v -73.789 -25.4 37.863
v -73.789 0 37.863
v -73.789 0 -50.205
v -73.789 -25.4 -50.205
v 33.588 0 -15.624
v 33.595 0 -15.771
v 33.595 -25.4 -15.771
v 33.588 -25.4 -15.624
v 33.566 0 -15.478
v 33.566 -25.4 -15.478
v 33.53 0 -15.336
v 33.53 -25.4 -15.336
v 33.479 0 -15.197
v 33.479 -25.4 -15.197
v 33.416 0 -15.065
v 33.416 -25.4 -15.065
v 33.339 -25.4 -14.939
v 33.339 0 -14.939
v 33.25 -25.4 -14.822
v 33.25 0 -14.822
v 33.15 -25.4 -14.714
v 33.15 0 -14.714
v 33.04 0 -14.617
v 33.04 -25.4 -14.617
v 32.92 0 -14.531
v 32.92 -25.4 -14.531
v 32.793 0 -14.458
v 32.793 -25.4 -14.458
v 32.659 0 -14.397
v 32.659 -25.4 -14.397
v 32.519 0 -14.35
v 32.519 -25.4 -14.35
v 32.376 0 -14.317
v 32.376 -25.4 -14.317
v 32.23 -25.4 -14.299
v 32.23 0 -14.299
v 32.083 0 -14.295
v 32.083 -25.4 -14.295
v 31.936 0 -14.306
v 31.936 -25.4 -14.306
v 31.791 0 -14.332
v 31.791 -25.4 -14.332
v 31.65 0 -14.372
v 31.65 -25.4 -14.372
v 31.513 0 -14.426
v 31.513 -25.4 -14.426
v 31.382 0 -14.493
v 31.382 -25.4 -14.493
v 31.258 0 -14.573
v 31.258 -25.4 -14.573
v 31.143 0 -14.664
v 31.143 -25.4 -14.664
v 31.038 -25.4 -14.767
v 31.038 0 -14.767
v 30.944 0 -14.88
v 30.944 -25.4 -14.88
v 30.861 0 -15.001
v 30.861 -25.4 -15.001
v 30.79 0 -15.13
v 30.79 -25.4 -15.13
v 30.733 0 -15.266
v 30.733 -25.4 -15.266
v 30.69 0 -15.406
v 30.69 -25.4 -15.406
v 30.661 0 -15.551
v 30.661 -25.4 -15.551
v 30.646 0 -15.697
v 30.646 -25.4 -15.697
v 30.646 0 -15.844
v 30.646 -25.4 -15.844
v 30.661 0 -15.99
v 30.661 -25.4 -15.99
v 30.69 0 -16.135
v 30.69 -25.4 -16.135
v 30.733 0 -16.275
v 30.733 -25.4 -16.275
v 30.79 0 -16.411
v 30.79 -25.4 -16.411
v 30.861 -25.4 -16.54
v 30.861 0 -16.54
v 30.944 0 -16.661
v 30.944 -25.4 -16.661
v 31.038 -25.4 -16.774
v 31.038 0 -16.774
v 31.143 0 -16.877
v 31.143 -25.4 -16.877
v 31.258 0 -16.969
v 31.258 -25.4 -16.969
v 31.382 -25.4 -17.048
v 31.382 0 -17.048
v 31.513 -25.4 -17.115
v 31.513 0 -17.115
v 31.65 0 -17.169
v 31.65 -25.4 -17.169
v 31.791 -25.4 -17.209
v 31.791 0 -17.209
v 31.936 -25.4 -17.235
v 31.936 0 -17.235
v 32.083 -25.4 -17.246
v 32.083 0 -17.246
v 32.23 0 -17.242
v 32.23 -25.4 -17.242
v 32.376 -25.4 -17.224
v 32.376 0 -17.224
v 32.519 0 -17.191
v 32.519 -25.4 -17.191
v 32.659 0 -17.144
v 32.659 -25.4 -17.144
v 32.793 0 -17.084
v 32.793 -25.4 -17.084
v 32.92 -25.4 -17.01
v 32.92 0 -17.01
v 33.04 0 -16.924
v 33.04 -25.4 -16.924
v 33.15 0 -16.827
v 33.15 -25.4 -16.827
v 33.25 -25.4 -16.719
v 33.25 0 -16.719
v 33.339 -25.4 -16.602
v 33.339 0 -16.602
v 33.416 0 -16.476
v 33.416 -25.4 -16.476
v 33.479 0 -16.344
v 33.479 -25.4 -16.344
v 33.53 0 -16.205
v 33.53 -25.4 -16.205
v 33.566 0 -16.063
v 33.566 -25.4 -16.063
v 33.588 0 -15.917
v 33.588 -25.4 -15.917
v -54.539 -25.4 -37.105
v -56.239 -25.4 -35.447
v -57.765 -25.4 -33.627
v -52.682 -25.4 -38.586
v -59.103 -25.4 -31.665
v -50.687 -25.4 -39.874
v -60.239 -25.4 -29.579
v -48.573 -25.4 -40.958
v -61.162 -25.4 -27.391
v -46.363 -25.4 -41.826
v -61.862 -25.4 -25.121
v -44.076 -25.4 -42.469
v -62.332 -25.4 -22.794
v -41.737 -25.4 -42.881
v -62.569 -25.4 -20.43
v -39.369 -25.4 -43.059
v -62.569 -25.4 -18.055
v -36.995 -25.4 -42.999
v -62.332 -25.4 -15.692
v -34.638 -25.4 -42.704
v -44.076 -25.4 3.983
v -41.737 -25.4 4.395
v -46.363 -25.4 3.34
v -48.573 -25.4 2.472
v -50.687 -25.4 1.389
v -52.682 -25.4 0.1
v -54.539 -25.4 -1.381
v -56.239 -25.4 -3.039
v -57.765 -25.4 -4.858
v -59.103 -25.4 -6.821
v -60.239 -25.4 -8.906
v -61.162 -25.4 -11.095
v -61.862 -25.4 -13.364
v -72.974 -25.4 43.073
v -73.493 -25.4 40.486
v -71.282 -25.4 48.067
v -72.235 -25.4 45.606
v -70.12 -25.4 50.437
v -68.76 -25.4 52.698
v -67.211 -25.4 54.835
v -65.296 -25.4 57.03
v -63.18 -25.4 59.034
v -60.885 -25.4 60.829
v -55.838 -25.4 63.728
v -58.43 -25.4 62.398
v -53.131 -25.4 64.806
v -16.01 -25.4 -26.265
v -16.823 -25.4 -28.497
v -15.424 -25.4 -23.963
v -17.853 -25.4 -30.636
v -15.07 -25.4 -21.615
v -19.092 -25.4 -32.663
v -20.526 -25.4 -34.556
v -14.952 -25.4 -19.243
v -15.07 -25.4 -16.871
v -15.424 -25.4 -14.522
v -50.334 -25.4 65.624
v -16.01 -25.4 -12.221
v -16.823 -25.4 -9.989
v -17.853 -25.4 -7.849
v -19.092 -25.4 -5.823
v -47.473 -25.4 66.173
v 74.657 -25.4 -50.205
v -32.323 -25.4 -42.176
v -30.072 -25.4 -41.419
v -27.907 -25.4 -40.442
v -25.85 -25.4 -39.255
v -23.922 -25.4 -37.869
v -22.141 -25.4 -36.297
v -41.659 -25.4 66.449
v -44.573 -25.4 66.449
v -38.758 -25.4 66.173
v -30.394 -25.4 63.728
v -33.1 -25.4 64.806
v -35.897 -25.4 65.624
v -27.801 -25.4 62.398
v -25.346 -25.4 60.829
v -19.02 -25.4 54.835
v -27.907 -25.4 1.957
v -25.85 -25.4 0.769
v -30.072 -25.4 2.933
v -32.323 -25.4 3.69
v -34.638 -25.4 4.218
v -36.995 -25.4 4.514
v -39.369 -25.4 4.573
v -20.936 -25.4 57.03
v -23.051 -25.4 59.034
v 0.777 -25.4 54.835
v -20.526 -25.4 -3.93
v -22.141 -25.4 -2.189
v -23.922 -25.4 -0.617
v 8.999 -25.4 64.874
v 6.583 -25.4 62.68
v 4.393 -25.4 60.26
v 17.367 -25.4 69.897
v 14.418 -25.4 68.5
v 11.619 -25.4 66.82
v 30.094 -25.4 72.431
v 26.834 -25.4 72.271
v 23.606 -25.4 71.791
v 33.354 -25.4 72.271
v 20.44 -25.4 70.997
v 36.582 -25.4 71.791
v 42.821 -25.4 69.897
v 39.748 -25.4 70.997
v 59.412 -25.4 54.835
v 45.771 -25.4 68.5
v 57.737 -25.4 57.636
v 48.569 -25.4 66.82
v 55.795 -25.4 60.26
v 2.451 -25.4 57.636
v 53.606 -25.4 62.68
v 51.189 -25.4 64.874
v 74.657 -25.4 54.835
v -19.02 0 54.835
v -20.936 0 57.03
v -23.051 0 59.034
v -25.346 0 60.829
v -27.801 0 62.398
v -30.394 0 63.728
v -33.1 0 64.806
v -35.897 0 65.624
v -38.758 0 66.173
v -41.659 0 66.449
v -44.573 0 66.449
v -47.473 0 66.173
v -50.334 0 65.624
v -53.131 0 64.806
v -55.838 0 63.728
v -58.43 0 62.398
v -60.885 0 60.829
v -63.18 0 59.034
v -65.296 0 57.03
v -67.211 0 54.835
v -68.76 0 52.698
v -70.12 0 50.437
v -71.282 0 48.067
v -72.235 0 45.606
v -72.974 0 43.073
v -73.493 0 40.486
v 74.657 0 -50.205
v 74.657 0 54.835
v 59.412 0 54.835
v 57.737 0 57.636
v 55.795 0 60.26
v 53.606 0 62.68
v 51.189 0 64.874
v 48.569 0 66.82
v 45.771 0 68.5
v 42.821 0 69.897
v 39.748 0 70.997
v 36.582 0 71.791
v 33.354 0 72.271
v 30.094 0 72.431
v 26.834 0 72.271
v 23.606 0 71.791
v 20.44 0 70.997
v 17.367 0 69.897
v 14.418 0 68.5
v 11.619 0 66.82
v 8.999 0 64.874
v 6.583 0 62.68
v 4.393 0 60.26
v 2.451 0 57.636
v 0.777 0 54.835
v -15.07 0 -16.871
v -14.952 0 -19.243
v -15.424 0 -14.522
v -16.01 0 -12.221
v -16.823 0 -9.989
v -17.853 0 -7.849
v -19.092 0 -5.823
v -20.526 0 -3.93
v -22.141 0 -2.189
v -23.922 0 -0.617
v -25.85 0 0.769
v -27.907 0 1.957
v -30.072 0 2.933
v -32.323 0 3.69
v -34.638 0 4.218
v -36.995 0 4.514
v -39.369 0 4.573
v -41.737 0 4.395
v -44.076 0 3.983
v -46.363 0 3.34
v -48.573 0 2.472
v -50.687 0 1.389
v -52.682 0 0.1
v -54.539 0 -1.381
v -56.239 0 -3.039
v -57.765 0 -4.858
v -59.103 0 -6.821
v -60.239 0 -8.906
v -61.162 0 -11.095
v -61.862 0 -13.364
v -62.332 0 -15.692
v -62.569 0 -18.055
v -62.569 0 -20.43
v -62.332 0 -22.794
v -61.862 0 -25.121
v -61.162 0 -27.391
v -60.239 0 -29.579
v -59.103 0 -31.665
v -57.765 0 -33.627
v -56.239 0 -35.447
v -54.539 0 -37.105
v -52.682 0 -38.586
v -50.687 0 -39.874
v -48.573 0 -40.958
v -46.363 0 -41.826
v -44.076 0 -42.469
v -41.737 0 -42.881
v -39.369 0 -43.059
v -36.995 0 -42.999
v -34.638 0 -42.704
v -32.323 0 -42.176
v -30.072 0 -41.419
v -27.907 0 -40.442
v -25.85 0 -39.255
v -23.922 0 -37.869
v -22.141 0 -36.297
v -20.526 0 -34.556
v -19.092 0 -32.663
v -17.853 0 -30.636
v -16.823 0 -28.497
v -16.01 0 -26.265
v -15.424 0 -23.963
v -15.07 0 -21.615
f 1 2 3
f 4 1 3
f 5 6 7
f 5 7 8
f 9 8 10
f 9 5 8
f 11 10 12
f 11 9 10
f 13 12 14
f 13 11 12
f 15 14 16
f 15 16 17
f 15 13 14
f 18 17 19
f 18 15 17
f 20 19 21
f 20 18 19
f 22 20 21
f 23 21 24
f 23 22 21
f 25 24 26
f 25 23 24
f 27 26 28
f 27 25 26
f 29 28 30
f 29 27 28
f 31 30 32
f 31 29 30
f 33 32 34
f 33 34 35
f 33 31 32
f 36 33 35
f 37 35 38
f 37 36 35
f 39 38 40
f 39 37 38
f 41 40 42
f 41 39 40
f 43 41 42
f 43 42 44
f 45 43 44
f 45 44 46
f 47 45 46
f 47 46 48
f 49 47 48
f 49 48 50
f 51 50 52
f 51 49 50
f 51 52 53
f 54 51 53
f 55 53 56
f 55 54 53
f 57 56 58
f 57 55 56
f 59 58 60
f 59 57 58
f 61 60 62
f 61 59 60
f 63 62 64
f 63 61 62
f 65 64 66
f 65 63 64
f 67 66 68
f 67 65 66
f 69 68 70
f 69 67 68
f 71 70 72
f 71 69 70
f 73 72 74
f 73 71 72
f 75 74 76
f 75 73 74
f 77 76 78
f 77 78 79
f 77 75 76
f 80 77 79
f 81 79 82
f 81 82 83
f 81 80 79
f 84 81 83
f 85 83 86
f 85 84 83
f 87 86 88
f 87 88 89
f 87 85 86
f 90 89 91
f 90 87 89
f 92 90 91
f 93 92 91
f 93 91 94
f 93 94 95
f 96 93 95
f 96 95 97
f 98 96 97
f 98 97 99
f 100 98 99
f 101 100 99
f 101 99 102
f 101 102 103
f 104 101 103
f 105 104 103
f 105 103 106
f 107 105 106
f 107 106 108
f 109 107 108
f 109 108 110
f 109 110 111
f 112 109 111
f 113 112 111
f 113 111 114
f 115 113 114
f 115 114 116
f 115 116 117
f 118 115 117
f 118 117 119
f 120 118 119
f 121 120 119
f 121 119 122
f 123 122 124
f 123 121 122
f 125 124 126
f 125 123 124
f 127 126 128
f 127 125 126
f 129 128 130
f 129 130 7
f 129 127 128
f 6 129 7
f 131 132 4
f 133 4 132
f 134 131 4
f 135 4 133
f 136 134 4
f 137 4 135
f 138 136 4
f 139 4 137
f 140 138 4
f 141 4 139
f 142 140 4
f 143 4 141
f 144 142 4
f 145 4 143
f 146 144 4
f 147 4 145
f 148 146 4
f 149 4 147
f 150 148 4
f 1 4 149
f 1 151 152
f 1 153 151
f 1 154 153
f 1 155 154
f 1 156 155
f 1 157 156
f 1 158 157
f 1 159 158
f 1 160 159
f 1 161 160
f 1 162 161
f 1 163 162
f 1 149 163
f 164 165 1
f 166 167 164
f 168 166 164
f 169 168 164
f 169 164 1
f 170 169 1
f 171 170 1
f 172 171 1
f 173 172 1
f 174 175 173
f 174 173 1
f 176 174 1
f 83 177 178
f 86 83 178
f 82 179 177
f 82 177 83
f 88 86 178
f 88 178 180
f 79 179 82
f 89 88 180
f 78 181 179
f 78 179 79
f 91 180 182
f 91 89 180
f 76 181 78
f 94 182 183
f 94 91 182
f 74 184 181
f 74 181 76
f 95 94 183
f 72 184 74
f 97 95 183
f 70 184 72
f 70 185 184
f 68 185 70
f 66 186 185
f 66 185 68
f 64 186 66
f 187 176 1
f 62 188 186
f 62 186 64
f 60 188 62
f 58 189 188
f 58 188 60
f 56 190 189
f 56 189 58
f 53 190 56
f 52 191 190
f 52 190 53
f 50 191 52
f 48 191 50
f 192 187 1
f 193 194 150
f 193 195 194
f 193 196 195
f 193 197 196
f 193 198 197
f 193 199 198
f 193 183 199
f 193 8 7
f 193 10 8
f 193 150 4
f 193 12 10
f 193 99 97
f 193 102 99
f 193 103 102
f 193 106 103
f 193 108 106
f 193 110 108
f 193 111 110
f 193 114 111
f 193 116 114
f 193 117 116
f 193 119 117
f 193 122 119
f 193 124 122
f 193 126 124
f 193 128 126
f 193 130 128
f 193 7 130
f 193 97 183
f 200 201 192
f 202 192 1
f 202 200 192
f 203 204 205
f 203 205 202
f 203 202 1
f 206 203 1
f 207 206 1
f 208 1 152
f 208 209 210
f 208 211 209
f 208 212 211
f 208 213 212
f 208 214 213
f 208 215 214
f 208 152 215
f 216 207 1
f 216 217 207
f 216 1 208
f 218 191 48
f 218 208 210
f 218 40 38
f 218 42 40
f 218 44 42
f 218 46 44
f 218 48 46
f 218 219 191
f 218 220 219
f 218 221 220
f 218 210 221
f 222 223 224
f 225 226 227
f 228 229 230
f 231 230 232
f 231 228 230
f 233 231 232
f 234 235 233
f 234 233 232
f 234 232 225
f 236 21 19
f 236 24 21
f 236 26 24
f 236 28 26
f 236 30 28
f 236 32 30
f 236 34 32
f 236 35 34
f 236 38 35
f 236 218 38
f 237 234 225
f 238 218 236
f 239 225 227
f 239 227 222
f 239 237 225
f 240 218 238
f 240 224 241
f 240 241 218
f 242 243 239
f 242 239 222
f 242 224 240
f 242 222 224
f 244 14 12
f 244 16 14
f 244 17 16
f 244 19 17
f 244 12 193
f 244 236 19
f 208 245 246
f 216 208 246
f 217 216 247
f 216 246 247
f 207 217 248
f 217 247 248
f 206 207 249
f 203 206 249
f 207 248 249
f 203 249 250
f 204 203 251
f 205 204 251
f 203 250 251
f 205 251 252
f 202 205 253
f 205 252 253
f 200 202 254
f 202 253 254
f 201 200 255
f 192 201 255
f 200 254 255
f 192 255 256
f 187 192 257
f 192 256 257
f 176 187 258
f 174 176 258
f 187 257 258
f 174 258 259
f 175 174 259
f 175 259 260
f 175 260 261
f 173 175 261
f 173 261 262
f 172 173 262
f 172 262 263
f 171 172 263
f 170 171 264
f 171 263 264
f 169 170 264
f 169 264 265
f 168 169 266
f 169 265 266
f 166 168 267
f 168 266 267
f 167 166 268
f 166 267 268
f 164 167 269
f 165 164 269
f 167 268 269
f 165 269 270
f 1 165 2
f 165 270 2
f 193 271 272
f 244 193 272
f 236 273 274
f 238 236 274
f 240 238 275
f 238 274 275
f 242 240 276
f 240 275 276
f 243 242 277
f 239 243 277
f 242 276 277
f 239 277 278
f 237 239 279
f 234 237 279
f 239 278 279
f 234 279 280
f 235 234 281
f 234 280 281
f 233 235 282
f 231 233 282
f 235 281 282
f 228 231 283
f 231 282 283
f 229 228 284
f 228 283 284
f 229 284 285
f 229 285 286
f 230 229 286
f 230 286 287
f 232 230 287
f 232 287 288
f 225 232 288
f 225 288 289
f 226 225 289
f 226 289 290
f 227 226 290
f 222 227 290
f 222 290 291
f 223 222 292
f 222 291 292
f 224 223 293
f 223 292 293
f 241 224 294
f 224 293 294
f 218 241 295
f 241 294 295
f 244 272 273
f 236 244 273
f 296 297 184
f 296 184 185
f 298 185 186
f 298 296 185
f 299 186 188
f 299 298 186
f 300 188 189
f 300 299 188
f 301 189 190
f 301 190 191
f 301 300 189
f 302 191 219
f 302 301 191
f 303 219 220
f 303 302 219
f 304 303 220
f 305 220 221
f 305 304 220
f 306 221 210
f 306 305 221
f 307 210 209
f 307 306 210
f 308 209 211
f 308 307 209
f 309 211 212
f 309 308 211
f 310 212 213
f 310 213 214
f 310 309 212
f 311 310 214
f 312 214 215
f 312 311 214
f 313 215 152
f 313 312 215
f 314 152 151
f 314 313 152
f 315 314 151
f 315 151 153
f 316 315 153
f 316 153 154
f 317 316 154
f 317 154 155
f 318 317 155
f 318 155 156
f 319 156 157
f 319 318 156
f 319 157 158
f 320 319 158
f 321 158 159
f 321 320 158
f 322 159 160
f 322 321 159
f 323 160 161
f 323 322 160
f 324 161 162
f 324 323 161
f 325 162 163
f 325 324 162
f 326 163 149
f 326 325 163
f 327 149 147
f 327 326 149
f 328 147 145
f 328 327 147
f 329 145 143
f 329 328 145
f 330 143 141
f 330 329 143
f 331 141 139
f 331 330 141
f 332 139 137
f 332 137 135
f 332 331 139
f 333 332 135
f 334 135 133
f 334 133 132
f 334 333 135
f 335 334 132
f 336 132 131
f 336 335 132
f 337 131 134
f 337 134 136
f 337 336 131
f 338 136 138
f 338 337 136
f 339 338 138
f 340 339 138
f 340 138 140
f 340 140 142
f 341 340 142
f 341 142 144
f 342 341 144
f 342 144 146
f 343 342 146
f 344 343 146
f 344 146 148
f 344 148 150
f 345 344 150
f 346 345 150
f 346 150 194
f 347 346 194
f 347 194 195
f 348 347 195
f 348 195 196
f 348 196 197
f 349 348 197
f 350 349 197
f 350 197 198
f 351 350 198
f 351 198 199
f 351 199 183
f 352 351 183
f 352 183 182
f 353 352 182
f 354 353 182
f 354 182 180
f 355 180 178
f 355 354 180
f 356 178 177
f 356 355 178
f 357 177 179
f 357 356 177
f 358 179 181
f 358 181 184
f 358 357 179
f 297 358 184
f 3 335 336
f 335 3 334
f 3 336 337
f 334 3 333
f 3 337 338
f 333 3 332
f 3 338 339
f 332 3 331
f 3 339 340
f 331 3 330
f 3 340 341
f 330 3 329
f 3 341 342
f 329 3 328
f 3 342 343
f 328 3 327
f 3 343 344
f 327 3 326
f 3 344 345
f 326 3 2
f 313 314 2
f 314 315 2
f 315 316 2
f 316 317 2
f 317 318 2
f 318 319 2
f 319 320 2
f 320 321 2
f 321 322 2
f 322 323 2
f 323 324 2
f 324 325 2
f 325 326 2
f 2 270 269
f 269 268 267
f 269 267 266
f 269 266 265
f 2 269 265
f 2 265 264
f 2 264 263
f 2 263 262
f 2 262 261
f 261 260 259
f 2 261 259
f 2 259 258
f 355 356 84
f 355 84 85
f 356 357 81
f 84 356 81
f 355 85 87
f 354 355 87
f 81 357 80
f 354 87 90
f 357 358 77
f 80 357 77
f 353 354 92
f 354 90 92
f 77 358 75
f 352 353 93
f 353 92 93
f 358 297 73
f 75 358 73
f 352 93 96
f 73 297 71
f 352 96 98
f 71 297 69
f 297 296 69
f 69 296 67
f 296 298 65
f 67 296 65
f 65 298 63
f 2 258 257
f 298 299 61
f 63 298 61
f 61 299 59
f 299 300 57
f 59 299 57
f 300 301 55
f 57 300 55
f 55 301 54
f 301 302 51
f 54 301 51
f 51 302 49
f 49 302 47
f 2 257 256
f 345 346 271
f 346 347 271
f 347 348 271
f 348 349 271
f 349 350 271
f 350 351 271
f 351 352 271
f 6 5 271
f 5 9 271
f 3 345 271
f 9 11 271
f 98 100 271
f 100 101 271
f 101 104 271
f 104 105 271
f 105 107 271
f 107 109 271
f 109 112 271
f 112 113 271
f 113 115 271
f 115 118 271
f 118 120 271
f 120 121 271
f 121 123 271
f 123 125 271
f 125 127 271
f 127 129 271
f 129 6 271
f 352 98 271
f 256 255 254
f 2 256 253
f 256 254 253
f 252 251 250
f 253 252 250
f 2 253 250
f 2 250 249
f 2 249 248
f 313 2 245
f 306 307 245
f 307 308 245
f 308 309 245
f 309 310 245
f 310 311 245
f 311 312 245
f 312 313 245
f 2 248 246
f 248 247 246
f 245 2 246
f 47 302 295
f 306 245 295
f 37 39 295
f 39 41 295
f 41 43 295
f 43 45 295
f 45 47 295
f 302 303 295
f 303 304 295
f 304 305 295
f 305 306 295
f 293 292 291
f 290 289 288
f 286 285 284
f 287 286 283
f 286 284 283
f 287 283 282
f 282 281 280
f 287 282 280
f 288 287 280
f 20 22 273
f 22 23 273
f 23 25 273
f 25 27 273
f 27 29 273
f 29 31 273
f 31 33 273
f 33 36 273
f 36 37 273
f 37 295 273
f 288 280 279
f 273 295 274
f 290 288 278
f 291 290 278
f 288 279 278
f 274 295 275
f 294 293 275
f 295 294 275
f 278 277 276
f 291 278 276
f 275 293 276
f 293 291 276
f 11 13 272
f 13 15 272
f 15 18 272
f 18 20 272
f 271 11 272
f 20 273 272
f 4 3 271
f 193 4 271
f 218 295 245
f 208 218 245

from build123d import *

# Parameters (mm, degrees)
F0_R     = 23.8231892188
F0_R_2   = 16.1761148504
F0_R_3   = 1.4754891284
F1_DEPTH = 25.4


with BuildPart() as f1:
    # F0 (on Front) → F1 (new body)
    with BuildSketch(Plane.XZ):
        with BuildLine():
            ThreePointArc((59.4117882899, 54.835062474), (30.0941746682, 72.4310516269), (0.7765610465, 54.835062474))
            Line((0.7765610465, 54.835062474), (59.4117882899, 54.835062474))
        make_face()
        with BuildLine():
            Line((59.4117882899, 54.835062474), (0.7765610465, 54.835062474))
            ThreePointArc((0.7765610465, 54.835062474), (22.0410833069, 6.9782518983), (63.3159871103, 39.2092391849))
            ThreePointArc((63.3159871103, 39.2092391849), (62.3251619547, 47.2623305461), (59.4117882899, 54.835062474))
        make_face()
        with BuildLine():
            Line((-19.0199100919, 54.835062474), (-67.2114855104, 54.835062474))
            ThreePointArc((-67.2114855104, 54.835062474), (-71.7847333832, 46.8469948963), (-73.788613081, 37.8632158535))
            Line((-73.788613081, 37.8632158535), (-73.788613081, 33.6104571325))
            ThreePointArc((-73.788613081, 33.6104571325), (-42.0518711488, 5.0087142952), (-12.3691659487, 35.736836493))
            ThreePointArc((-12.3691659487, 35.736836493), (-14.079417691, 45.8483971203), (-19.0199100919, 54.835062474))
        make_face()
        with BuildLine():
            ThreePointArc((-19.0199100919, 54.835062474), (-43.1156978011, 66.4833683454), (-67.2114855104, 54.835062474))
            Line((-67.2114855104, 54.835062474), (-19.0199100919, 54.835062474))
        make_face()
        with BuildLine():
            Line((0.7765610465, 54.835062474), (-19.0199100919, 54.835062474))
            ThreePointArc((-19.0199100919, 54.835062474), (-14.079417691, 45.8483971203), (-12.3691659487, 35.736836493))
            ThreePointArc((-12.3691659487, 35.736836493), (-42.0518711488, 5.0087142952), (-73.788613081, 33.6104571325))
            Line((-73.788613081, 33.6104571325), (-73.788613081, -50.20519346))
            Line((-73.788613081, -50.20519346), (74.6567100286, -50.20519346))
            Line((74.6567100286, -50.20519346), (74.6567100286, 54.835062474))
            Line((74.6567100286, 54.835062474), (59.4117882899, 54.835062474))
            ThreePointArc((59.4117882899, 54.835062474), (62.3251619547, 47.2623305461), (63.3159871103, 39.2092391849))
            ThreePointArc((63.3159871103, 39.2092391849), (22.0410833069, 6.9782518983), (0.7765610465, 54.835062474))
        make_face()
        with Locations((-38.775190711, -19.2429125309)):
            Circle(F0_R, mode=Mode.SUBTRACT)
        with Locations((32.119743526, -15.7705061138)):
            Circle(F0_R_2, mode=Mode.SUBTRACT)
        with Locations((32.119743526, -15.7705061138)):
            Circle(F0_R_2)
        with Locations((32.119743526, -15.7705061138)):
            Circle(F0_R_3, mode=Mode.SUBTRACT)
    extrude(amount=F1_DEPTH)


solid = f1.part
